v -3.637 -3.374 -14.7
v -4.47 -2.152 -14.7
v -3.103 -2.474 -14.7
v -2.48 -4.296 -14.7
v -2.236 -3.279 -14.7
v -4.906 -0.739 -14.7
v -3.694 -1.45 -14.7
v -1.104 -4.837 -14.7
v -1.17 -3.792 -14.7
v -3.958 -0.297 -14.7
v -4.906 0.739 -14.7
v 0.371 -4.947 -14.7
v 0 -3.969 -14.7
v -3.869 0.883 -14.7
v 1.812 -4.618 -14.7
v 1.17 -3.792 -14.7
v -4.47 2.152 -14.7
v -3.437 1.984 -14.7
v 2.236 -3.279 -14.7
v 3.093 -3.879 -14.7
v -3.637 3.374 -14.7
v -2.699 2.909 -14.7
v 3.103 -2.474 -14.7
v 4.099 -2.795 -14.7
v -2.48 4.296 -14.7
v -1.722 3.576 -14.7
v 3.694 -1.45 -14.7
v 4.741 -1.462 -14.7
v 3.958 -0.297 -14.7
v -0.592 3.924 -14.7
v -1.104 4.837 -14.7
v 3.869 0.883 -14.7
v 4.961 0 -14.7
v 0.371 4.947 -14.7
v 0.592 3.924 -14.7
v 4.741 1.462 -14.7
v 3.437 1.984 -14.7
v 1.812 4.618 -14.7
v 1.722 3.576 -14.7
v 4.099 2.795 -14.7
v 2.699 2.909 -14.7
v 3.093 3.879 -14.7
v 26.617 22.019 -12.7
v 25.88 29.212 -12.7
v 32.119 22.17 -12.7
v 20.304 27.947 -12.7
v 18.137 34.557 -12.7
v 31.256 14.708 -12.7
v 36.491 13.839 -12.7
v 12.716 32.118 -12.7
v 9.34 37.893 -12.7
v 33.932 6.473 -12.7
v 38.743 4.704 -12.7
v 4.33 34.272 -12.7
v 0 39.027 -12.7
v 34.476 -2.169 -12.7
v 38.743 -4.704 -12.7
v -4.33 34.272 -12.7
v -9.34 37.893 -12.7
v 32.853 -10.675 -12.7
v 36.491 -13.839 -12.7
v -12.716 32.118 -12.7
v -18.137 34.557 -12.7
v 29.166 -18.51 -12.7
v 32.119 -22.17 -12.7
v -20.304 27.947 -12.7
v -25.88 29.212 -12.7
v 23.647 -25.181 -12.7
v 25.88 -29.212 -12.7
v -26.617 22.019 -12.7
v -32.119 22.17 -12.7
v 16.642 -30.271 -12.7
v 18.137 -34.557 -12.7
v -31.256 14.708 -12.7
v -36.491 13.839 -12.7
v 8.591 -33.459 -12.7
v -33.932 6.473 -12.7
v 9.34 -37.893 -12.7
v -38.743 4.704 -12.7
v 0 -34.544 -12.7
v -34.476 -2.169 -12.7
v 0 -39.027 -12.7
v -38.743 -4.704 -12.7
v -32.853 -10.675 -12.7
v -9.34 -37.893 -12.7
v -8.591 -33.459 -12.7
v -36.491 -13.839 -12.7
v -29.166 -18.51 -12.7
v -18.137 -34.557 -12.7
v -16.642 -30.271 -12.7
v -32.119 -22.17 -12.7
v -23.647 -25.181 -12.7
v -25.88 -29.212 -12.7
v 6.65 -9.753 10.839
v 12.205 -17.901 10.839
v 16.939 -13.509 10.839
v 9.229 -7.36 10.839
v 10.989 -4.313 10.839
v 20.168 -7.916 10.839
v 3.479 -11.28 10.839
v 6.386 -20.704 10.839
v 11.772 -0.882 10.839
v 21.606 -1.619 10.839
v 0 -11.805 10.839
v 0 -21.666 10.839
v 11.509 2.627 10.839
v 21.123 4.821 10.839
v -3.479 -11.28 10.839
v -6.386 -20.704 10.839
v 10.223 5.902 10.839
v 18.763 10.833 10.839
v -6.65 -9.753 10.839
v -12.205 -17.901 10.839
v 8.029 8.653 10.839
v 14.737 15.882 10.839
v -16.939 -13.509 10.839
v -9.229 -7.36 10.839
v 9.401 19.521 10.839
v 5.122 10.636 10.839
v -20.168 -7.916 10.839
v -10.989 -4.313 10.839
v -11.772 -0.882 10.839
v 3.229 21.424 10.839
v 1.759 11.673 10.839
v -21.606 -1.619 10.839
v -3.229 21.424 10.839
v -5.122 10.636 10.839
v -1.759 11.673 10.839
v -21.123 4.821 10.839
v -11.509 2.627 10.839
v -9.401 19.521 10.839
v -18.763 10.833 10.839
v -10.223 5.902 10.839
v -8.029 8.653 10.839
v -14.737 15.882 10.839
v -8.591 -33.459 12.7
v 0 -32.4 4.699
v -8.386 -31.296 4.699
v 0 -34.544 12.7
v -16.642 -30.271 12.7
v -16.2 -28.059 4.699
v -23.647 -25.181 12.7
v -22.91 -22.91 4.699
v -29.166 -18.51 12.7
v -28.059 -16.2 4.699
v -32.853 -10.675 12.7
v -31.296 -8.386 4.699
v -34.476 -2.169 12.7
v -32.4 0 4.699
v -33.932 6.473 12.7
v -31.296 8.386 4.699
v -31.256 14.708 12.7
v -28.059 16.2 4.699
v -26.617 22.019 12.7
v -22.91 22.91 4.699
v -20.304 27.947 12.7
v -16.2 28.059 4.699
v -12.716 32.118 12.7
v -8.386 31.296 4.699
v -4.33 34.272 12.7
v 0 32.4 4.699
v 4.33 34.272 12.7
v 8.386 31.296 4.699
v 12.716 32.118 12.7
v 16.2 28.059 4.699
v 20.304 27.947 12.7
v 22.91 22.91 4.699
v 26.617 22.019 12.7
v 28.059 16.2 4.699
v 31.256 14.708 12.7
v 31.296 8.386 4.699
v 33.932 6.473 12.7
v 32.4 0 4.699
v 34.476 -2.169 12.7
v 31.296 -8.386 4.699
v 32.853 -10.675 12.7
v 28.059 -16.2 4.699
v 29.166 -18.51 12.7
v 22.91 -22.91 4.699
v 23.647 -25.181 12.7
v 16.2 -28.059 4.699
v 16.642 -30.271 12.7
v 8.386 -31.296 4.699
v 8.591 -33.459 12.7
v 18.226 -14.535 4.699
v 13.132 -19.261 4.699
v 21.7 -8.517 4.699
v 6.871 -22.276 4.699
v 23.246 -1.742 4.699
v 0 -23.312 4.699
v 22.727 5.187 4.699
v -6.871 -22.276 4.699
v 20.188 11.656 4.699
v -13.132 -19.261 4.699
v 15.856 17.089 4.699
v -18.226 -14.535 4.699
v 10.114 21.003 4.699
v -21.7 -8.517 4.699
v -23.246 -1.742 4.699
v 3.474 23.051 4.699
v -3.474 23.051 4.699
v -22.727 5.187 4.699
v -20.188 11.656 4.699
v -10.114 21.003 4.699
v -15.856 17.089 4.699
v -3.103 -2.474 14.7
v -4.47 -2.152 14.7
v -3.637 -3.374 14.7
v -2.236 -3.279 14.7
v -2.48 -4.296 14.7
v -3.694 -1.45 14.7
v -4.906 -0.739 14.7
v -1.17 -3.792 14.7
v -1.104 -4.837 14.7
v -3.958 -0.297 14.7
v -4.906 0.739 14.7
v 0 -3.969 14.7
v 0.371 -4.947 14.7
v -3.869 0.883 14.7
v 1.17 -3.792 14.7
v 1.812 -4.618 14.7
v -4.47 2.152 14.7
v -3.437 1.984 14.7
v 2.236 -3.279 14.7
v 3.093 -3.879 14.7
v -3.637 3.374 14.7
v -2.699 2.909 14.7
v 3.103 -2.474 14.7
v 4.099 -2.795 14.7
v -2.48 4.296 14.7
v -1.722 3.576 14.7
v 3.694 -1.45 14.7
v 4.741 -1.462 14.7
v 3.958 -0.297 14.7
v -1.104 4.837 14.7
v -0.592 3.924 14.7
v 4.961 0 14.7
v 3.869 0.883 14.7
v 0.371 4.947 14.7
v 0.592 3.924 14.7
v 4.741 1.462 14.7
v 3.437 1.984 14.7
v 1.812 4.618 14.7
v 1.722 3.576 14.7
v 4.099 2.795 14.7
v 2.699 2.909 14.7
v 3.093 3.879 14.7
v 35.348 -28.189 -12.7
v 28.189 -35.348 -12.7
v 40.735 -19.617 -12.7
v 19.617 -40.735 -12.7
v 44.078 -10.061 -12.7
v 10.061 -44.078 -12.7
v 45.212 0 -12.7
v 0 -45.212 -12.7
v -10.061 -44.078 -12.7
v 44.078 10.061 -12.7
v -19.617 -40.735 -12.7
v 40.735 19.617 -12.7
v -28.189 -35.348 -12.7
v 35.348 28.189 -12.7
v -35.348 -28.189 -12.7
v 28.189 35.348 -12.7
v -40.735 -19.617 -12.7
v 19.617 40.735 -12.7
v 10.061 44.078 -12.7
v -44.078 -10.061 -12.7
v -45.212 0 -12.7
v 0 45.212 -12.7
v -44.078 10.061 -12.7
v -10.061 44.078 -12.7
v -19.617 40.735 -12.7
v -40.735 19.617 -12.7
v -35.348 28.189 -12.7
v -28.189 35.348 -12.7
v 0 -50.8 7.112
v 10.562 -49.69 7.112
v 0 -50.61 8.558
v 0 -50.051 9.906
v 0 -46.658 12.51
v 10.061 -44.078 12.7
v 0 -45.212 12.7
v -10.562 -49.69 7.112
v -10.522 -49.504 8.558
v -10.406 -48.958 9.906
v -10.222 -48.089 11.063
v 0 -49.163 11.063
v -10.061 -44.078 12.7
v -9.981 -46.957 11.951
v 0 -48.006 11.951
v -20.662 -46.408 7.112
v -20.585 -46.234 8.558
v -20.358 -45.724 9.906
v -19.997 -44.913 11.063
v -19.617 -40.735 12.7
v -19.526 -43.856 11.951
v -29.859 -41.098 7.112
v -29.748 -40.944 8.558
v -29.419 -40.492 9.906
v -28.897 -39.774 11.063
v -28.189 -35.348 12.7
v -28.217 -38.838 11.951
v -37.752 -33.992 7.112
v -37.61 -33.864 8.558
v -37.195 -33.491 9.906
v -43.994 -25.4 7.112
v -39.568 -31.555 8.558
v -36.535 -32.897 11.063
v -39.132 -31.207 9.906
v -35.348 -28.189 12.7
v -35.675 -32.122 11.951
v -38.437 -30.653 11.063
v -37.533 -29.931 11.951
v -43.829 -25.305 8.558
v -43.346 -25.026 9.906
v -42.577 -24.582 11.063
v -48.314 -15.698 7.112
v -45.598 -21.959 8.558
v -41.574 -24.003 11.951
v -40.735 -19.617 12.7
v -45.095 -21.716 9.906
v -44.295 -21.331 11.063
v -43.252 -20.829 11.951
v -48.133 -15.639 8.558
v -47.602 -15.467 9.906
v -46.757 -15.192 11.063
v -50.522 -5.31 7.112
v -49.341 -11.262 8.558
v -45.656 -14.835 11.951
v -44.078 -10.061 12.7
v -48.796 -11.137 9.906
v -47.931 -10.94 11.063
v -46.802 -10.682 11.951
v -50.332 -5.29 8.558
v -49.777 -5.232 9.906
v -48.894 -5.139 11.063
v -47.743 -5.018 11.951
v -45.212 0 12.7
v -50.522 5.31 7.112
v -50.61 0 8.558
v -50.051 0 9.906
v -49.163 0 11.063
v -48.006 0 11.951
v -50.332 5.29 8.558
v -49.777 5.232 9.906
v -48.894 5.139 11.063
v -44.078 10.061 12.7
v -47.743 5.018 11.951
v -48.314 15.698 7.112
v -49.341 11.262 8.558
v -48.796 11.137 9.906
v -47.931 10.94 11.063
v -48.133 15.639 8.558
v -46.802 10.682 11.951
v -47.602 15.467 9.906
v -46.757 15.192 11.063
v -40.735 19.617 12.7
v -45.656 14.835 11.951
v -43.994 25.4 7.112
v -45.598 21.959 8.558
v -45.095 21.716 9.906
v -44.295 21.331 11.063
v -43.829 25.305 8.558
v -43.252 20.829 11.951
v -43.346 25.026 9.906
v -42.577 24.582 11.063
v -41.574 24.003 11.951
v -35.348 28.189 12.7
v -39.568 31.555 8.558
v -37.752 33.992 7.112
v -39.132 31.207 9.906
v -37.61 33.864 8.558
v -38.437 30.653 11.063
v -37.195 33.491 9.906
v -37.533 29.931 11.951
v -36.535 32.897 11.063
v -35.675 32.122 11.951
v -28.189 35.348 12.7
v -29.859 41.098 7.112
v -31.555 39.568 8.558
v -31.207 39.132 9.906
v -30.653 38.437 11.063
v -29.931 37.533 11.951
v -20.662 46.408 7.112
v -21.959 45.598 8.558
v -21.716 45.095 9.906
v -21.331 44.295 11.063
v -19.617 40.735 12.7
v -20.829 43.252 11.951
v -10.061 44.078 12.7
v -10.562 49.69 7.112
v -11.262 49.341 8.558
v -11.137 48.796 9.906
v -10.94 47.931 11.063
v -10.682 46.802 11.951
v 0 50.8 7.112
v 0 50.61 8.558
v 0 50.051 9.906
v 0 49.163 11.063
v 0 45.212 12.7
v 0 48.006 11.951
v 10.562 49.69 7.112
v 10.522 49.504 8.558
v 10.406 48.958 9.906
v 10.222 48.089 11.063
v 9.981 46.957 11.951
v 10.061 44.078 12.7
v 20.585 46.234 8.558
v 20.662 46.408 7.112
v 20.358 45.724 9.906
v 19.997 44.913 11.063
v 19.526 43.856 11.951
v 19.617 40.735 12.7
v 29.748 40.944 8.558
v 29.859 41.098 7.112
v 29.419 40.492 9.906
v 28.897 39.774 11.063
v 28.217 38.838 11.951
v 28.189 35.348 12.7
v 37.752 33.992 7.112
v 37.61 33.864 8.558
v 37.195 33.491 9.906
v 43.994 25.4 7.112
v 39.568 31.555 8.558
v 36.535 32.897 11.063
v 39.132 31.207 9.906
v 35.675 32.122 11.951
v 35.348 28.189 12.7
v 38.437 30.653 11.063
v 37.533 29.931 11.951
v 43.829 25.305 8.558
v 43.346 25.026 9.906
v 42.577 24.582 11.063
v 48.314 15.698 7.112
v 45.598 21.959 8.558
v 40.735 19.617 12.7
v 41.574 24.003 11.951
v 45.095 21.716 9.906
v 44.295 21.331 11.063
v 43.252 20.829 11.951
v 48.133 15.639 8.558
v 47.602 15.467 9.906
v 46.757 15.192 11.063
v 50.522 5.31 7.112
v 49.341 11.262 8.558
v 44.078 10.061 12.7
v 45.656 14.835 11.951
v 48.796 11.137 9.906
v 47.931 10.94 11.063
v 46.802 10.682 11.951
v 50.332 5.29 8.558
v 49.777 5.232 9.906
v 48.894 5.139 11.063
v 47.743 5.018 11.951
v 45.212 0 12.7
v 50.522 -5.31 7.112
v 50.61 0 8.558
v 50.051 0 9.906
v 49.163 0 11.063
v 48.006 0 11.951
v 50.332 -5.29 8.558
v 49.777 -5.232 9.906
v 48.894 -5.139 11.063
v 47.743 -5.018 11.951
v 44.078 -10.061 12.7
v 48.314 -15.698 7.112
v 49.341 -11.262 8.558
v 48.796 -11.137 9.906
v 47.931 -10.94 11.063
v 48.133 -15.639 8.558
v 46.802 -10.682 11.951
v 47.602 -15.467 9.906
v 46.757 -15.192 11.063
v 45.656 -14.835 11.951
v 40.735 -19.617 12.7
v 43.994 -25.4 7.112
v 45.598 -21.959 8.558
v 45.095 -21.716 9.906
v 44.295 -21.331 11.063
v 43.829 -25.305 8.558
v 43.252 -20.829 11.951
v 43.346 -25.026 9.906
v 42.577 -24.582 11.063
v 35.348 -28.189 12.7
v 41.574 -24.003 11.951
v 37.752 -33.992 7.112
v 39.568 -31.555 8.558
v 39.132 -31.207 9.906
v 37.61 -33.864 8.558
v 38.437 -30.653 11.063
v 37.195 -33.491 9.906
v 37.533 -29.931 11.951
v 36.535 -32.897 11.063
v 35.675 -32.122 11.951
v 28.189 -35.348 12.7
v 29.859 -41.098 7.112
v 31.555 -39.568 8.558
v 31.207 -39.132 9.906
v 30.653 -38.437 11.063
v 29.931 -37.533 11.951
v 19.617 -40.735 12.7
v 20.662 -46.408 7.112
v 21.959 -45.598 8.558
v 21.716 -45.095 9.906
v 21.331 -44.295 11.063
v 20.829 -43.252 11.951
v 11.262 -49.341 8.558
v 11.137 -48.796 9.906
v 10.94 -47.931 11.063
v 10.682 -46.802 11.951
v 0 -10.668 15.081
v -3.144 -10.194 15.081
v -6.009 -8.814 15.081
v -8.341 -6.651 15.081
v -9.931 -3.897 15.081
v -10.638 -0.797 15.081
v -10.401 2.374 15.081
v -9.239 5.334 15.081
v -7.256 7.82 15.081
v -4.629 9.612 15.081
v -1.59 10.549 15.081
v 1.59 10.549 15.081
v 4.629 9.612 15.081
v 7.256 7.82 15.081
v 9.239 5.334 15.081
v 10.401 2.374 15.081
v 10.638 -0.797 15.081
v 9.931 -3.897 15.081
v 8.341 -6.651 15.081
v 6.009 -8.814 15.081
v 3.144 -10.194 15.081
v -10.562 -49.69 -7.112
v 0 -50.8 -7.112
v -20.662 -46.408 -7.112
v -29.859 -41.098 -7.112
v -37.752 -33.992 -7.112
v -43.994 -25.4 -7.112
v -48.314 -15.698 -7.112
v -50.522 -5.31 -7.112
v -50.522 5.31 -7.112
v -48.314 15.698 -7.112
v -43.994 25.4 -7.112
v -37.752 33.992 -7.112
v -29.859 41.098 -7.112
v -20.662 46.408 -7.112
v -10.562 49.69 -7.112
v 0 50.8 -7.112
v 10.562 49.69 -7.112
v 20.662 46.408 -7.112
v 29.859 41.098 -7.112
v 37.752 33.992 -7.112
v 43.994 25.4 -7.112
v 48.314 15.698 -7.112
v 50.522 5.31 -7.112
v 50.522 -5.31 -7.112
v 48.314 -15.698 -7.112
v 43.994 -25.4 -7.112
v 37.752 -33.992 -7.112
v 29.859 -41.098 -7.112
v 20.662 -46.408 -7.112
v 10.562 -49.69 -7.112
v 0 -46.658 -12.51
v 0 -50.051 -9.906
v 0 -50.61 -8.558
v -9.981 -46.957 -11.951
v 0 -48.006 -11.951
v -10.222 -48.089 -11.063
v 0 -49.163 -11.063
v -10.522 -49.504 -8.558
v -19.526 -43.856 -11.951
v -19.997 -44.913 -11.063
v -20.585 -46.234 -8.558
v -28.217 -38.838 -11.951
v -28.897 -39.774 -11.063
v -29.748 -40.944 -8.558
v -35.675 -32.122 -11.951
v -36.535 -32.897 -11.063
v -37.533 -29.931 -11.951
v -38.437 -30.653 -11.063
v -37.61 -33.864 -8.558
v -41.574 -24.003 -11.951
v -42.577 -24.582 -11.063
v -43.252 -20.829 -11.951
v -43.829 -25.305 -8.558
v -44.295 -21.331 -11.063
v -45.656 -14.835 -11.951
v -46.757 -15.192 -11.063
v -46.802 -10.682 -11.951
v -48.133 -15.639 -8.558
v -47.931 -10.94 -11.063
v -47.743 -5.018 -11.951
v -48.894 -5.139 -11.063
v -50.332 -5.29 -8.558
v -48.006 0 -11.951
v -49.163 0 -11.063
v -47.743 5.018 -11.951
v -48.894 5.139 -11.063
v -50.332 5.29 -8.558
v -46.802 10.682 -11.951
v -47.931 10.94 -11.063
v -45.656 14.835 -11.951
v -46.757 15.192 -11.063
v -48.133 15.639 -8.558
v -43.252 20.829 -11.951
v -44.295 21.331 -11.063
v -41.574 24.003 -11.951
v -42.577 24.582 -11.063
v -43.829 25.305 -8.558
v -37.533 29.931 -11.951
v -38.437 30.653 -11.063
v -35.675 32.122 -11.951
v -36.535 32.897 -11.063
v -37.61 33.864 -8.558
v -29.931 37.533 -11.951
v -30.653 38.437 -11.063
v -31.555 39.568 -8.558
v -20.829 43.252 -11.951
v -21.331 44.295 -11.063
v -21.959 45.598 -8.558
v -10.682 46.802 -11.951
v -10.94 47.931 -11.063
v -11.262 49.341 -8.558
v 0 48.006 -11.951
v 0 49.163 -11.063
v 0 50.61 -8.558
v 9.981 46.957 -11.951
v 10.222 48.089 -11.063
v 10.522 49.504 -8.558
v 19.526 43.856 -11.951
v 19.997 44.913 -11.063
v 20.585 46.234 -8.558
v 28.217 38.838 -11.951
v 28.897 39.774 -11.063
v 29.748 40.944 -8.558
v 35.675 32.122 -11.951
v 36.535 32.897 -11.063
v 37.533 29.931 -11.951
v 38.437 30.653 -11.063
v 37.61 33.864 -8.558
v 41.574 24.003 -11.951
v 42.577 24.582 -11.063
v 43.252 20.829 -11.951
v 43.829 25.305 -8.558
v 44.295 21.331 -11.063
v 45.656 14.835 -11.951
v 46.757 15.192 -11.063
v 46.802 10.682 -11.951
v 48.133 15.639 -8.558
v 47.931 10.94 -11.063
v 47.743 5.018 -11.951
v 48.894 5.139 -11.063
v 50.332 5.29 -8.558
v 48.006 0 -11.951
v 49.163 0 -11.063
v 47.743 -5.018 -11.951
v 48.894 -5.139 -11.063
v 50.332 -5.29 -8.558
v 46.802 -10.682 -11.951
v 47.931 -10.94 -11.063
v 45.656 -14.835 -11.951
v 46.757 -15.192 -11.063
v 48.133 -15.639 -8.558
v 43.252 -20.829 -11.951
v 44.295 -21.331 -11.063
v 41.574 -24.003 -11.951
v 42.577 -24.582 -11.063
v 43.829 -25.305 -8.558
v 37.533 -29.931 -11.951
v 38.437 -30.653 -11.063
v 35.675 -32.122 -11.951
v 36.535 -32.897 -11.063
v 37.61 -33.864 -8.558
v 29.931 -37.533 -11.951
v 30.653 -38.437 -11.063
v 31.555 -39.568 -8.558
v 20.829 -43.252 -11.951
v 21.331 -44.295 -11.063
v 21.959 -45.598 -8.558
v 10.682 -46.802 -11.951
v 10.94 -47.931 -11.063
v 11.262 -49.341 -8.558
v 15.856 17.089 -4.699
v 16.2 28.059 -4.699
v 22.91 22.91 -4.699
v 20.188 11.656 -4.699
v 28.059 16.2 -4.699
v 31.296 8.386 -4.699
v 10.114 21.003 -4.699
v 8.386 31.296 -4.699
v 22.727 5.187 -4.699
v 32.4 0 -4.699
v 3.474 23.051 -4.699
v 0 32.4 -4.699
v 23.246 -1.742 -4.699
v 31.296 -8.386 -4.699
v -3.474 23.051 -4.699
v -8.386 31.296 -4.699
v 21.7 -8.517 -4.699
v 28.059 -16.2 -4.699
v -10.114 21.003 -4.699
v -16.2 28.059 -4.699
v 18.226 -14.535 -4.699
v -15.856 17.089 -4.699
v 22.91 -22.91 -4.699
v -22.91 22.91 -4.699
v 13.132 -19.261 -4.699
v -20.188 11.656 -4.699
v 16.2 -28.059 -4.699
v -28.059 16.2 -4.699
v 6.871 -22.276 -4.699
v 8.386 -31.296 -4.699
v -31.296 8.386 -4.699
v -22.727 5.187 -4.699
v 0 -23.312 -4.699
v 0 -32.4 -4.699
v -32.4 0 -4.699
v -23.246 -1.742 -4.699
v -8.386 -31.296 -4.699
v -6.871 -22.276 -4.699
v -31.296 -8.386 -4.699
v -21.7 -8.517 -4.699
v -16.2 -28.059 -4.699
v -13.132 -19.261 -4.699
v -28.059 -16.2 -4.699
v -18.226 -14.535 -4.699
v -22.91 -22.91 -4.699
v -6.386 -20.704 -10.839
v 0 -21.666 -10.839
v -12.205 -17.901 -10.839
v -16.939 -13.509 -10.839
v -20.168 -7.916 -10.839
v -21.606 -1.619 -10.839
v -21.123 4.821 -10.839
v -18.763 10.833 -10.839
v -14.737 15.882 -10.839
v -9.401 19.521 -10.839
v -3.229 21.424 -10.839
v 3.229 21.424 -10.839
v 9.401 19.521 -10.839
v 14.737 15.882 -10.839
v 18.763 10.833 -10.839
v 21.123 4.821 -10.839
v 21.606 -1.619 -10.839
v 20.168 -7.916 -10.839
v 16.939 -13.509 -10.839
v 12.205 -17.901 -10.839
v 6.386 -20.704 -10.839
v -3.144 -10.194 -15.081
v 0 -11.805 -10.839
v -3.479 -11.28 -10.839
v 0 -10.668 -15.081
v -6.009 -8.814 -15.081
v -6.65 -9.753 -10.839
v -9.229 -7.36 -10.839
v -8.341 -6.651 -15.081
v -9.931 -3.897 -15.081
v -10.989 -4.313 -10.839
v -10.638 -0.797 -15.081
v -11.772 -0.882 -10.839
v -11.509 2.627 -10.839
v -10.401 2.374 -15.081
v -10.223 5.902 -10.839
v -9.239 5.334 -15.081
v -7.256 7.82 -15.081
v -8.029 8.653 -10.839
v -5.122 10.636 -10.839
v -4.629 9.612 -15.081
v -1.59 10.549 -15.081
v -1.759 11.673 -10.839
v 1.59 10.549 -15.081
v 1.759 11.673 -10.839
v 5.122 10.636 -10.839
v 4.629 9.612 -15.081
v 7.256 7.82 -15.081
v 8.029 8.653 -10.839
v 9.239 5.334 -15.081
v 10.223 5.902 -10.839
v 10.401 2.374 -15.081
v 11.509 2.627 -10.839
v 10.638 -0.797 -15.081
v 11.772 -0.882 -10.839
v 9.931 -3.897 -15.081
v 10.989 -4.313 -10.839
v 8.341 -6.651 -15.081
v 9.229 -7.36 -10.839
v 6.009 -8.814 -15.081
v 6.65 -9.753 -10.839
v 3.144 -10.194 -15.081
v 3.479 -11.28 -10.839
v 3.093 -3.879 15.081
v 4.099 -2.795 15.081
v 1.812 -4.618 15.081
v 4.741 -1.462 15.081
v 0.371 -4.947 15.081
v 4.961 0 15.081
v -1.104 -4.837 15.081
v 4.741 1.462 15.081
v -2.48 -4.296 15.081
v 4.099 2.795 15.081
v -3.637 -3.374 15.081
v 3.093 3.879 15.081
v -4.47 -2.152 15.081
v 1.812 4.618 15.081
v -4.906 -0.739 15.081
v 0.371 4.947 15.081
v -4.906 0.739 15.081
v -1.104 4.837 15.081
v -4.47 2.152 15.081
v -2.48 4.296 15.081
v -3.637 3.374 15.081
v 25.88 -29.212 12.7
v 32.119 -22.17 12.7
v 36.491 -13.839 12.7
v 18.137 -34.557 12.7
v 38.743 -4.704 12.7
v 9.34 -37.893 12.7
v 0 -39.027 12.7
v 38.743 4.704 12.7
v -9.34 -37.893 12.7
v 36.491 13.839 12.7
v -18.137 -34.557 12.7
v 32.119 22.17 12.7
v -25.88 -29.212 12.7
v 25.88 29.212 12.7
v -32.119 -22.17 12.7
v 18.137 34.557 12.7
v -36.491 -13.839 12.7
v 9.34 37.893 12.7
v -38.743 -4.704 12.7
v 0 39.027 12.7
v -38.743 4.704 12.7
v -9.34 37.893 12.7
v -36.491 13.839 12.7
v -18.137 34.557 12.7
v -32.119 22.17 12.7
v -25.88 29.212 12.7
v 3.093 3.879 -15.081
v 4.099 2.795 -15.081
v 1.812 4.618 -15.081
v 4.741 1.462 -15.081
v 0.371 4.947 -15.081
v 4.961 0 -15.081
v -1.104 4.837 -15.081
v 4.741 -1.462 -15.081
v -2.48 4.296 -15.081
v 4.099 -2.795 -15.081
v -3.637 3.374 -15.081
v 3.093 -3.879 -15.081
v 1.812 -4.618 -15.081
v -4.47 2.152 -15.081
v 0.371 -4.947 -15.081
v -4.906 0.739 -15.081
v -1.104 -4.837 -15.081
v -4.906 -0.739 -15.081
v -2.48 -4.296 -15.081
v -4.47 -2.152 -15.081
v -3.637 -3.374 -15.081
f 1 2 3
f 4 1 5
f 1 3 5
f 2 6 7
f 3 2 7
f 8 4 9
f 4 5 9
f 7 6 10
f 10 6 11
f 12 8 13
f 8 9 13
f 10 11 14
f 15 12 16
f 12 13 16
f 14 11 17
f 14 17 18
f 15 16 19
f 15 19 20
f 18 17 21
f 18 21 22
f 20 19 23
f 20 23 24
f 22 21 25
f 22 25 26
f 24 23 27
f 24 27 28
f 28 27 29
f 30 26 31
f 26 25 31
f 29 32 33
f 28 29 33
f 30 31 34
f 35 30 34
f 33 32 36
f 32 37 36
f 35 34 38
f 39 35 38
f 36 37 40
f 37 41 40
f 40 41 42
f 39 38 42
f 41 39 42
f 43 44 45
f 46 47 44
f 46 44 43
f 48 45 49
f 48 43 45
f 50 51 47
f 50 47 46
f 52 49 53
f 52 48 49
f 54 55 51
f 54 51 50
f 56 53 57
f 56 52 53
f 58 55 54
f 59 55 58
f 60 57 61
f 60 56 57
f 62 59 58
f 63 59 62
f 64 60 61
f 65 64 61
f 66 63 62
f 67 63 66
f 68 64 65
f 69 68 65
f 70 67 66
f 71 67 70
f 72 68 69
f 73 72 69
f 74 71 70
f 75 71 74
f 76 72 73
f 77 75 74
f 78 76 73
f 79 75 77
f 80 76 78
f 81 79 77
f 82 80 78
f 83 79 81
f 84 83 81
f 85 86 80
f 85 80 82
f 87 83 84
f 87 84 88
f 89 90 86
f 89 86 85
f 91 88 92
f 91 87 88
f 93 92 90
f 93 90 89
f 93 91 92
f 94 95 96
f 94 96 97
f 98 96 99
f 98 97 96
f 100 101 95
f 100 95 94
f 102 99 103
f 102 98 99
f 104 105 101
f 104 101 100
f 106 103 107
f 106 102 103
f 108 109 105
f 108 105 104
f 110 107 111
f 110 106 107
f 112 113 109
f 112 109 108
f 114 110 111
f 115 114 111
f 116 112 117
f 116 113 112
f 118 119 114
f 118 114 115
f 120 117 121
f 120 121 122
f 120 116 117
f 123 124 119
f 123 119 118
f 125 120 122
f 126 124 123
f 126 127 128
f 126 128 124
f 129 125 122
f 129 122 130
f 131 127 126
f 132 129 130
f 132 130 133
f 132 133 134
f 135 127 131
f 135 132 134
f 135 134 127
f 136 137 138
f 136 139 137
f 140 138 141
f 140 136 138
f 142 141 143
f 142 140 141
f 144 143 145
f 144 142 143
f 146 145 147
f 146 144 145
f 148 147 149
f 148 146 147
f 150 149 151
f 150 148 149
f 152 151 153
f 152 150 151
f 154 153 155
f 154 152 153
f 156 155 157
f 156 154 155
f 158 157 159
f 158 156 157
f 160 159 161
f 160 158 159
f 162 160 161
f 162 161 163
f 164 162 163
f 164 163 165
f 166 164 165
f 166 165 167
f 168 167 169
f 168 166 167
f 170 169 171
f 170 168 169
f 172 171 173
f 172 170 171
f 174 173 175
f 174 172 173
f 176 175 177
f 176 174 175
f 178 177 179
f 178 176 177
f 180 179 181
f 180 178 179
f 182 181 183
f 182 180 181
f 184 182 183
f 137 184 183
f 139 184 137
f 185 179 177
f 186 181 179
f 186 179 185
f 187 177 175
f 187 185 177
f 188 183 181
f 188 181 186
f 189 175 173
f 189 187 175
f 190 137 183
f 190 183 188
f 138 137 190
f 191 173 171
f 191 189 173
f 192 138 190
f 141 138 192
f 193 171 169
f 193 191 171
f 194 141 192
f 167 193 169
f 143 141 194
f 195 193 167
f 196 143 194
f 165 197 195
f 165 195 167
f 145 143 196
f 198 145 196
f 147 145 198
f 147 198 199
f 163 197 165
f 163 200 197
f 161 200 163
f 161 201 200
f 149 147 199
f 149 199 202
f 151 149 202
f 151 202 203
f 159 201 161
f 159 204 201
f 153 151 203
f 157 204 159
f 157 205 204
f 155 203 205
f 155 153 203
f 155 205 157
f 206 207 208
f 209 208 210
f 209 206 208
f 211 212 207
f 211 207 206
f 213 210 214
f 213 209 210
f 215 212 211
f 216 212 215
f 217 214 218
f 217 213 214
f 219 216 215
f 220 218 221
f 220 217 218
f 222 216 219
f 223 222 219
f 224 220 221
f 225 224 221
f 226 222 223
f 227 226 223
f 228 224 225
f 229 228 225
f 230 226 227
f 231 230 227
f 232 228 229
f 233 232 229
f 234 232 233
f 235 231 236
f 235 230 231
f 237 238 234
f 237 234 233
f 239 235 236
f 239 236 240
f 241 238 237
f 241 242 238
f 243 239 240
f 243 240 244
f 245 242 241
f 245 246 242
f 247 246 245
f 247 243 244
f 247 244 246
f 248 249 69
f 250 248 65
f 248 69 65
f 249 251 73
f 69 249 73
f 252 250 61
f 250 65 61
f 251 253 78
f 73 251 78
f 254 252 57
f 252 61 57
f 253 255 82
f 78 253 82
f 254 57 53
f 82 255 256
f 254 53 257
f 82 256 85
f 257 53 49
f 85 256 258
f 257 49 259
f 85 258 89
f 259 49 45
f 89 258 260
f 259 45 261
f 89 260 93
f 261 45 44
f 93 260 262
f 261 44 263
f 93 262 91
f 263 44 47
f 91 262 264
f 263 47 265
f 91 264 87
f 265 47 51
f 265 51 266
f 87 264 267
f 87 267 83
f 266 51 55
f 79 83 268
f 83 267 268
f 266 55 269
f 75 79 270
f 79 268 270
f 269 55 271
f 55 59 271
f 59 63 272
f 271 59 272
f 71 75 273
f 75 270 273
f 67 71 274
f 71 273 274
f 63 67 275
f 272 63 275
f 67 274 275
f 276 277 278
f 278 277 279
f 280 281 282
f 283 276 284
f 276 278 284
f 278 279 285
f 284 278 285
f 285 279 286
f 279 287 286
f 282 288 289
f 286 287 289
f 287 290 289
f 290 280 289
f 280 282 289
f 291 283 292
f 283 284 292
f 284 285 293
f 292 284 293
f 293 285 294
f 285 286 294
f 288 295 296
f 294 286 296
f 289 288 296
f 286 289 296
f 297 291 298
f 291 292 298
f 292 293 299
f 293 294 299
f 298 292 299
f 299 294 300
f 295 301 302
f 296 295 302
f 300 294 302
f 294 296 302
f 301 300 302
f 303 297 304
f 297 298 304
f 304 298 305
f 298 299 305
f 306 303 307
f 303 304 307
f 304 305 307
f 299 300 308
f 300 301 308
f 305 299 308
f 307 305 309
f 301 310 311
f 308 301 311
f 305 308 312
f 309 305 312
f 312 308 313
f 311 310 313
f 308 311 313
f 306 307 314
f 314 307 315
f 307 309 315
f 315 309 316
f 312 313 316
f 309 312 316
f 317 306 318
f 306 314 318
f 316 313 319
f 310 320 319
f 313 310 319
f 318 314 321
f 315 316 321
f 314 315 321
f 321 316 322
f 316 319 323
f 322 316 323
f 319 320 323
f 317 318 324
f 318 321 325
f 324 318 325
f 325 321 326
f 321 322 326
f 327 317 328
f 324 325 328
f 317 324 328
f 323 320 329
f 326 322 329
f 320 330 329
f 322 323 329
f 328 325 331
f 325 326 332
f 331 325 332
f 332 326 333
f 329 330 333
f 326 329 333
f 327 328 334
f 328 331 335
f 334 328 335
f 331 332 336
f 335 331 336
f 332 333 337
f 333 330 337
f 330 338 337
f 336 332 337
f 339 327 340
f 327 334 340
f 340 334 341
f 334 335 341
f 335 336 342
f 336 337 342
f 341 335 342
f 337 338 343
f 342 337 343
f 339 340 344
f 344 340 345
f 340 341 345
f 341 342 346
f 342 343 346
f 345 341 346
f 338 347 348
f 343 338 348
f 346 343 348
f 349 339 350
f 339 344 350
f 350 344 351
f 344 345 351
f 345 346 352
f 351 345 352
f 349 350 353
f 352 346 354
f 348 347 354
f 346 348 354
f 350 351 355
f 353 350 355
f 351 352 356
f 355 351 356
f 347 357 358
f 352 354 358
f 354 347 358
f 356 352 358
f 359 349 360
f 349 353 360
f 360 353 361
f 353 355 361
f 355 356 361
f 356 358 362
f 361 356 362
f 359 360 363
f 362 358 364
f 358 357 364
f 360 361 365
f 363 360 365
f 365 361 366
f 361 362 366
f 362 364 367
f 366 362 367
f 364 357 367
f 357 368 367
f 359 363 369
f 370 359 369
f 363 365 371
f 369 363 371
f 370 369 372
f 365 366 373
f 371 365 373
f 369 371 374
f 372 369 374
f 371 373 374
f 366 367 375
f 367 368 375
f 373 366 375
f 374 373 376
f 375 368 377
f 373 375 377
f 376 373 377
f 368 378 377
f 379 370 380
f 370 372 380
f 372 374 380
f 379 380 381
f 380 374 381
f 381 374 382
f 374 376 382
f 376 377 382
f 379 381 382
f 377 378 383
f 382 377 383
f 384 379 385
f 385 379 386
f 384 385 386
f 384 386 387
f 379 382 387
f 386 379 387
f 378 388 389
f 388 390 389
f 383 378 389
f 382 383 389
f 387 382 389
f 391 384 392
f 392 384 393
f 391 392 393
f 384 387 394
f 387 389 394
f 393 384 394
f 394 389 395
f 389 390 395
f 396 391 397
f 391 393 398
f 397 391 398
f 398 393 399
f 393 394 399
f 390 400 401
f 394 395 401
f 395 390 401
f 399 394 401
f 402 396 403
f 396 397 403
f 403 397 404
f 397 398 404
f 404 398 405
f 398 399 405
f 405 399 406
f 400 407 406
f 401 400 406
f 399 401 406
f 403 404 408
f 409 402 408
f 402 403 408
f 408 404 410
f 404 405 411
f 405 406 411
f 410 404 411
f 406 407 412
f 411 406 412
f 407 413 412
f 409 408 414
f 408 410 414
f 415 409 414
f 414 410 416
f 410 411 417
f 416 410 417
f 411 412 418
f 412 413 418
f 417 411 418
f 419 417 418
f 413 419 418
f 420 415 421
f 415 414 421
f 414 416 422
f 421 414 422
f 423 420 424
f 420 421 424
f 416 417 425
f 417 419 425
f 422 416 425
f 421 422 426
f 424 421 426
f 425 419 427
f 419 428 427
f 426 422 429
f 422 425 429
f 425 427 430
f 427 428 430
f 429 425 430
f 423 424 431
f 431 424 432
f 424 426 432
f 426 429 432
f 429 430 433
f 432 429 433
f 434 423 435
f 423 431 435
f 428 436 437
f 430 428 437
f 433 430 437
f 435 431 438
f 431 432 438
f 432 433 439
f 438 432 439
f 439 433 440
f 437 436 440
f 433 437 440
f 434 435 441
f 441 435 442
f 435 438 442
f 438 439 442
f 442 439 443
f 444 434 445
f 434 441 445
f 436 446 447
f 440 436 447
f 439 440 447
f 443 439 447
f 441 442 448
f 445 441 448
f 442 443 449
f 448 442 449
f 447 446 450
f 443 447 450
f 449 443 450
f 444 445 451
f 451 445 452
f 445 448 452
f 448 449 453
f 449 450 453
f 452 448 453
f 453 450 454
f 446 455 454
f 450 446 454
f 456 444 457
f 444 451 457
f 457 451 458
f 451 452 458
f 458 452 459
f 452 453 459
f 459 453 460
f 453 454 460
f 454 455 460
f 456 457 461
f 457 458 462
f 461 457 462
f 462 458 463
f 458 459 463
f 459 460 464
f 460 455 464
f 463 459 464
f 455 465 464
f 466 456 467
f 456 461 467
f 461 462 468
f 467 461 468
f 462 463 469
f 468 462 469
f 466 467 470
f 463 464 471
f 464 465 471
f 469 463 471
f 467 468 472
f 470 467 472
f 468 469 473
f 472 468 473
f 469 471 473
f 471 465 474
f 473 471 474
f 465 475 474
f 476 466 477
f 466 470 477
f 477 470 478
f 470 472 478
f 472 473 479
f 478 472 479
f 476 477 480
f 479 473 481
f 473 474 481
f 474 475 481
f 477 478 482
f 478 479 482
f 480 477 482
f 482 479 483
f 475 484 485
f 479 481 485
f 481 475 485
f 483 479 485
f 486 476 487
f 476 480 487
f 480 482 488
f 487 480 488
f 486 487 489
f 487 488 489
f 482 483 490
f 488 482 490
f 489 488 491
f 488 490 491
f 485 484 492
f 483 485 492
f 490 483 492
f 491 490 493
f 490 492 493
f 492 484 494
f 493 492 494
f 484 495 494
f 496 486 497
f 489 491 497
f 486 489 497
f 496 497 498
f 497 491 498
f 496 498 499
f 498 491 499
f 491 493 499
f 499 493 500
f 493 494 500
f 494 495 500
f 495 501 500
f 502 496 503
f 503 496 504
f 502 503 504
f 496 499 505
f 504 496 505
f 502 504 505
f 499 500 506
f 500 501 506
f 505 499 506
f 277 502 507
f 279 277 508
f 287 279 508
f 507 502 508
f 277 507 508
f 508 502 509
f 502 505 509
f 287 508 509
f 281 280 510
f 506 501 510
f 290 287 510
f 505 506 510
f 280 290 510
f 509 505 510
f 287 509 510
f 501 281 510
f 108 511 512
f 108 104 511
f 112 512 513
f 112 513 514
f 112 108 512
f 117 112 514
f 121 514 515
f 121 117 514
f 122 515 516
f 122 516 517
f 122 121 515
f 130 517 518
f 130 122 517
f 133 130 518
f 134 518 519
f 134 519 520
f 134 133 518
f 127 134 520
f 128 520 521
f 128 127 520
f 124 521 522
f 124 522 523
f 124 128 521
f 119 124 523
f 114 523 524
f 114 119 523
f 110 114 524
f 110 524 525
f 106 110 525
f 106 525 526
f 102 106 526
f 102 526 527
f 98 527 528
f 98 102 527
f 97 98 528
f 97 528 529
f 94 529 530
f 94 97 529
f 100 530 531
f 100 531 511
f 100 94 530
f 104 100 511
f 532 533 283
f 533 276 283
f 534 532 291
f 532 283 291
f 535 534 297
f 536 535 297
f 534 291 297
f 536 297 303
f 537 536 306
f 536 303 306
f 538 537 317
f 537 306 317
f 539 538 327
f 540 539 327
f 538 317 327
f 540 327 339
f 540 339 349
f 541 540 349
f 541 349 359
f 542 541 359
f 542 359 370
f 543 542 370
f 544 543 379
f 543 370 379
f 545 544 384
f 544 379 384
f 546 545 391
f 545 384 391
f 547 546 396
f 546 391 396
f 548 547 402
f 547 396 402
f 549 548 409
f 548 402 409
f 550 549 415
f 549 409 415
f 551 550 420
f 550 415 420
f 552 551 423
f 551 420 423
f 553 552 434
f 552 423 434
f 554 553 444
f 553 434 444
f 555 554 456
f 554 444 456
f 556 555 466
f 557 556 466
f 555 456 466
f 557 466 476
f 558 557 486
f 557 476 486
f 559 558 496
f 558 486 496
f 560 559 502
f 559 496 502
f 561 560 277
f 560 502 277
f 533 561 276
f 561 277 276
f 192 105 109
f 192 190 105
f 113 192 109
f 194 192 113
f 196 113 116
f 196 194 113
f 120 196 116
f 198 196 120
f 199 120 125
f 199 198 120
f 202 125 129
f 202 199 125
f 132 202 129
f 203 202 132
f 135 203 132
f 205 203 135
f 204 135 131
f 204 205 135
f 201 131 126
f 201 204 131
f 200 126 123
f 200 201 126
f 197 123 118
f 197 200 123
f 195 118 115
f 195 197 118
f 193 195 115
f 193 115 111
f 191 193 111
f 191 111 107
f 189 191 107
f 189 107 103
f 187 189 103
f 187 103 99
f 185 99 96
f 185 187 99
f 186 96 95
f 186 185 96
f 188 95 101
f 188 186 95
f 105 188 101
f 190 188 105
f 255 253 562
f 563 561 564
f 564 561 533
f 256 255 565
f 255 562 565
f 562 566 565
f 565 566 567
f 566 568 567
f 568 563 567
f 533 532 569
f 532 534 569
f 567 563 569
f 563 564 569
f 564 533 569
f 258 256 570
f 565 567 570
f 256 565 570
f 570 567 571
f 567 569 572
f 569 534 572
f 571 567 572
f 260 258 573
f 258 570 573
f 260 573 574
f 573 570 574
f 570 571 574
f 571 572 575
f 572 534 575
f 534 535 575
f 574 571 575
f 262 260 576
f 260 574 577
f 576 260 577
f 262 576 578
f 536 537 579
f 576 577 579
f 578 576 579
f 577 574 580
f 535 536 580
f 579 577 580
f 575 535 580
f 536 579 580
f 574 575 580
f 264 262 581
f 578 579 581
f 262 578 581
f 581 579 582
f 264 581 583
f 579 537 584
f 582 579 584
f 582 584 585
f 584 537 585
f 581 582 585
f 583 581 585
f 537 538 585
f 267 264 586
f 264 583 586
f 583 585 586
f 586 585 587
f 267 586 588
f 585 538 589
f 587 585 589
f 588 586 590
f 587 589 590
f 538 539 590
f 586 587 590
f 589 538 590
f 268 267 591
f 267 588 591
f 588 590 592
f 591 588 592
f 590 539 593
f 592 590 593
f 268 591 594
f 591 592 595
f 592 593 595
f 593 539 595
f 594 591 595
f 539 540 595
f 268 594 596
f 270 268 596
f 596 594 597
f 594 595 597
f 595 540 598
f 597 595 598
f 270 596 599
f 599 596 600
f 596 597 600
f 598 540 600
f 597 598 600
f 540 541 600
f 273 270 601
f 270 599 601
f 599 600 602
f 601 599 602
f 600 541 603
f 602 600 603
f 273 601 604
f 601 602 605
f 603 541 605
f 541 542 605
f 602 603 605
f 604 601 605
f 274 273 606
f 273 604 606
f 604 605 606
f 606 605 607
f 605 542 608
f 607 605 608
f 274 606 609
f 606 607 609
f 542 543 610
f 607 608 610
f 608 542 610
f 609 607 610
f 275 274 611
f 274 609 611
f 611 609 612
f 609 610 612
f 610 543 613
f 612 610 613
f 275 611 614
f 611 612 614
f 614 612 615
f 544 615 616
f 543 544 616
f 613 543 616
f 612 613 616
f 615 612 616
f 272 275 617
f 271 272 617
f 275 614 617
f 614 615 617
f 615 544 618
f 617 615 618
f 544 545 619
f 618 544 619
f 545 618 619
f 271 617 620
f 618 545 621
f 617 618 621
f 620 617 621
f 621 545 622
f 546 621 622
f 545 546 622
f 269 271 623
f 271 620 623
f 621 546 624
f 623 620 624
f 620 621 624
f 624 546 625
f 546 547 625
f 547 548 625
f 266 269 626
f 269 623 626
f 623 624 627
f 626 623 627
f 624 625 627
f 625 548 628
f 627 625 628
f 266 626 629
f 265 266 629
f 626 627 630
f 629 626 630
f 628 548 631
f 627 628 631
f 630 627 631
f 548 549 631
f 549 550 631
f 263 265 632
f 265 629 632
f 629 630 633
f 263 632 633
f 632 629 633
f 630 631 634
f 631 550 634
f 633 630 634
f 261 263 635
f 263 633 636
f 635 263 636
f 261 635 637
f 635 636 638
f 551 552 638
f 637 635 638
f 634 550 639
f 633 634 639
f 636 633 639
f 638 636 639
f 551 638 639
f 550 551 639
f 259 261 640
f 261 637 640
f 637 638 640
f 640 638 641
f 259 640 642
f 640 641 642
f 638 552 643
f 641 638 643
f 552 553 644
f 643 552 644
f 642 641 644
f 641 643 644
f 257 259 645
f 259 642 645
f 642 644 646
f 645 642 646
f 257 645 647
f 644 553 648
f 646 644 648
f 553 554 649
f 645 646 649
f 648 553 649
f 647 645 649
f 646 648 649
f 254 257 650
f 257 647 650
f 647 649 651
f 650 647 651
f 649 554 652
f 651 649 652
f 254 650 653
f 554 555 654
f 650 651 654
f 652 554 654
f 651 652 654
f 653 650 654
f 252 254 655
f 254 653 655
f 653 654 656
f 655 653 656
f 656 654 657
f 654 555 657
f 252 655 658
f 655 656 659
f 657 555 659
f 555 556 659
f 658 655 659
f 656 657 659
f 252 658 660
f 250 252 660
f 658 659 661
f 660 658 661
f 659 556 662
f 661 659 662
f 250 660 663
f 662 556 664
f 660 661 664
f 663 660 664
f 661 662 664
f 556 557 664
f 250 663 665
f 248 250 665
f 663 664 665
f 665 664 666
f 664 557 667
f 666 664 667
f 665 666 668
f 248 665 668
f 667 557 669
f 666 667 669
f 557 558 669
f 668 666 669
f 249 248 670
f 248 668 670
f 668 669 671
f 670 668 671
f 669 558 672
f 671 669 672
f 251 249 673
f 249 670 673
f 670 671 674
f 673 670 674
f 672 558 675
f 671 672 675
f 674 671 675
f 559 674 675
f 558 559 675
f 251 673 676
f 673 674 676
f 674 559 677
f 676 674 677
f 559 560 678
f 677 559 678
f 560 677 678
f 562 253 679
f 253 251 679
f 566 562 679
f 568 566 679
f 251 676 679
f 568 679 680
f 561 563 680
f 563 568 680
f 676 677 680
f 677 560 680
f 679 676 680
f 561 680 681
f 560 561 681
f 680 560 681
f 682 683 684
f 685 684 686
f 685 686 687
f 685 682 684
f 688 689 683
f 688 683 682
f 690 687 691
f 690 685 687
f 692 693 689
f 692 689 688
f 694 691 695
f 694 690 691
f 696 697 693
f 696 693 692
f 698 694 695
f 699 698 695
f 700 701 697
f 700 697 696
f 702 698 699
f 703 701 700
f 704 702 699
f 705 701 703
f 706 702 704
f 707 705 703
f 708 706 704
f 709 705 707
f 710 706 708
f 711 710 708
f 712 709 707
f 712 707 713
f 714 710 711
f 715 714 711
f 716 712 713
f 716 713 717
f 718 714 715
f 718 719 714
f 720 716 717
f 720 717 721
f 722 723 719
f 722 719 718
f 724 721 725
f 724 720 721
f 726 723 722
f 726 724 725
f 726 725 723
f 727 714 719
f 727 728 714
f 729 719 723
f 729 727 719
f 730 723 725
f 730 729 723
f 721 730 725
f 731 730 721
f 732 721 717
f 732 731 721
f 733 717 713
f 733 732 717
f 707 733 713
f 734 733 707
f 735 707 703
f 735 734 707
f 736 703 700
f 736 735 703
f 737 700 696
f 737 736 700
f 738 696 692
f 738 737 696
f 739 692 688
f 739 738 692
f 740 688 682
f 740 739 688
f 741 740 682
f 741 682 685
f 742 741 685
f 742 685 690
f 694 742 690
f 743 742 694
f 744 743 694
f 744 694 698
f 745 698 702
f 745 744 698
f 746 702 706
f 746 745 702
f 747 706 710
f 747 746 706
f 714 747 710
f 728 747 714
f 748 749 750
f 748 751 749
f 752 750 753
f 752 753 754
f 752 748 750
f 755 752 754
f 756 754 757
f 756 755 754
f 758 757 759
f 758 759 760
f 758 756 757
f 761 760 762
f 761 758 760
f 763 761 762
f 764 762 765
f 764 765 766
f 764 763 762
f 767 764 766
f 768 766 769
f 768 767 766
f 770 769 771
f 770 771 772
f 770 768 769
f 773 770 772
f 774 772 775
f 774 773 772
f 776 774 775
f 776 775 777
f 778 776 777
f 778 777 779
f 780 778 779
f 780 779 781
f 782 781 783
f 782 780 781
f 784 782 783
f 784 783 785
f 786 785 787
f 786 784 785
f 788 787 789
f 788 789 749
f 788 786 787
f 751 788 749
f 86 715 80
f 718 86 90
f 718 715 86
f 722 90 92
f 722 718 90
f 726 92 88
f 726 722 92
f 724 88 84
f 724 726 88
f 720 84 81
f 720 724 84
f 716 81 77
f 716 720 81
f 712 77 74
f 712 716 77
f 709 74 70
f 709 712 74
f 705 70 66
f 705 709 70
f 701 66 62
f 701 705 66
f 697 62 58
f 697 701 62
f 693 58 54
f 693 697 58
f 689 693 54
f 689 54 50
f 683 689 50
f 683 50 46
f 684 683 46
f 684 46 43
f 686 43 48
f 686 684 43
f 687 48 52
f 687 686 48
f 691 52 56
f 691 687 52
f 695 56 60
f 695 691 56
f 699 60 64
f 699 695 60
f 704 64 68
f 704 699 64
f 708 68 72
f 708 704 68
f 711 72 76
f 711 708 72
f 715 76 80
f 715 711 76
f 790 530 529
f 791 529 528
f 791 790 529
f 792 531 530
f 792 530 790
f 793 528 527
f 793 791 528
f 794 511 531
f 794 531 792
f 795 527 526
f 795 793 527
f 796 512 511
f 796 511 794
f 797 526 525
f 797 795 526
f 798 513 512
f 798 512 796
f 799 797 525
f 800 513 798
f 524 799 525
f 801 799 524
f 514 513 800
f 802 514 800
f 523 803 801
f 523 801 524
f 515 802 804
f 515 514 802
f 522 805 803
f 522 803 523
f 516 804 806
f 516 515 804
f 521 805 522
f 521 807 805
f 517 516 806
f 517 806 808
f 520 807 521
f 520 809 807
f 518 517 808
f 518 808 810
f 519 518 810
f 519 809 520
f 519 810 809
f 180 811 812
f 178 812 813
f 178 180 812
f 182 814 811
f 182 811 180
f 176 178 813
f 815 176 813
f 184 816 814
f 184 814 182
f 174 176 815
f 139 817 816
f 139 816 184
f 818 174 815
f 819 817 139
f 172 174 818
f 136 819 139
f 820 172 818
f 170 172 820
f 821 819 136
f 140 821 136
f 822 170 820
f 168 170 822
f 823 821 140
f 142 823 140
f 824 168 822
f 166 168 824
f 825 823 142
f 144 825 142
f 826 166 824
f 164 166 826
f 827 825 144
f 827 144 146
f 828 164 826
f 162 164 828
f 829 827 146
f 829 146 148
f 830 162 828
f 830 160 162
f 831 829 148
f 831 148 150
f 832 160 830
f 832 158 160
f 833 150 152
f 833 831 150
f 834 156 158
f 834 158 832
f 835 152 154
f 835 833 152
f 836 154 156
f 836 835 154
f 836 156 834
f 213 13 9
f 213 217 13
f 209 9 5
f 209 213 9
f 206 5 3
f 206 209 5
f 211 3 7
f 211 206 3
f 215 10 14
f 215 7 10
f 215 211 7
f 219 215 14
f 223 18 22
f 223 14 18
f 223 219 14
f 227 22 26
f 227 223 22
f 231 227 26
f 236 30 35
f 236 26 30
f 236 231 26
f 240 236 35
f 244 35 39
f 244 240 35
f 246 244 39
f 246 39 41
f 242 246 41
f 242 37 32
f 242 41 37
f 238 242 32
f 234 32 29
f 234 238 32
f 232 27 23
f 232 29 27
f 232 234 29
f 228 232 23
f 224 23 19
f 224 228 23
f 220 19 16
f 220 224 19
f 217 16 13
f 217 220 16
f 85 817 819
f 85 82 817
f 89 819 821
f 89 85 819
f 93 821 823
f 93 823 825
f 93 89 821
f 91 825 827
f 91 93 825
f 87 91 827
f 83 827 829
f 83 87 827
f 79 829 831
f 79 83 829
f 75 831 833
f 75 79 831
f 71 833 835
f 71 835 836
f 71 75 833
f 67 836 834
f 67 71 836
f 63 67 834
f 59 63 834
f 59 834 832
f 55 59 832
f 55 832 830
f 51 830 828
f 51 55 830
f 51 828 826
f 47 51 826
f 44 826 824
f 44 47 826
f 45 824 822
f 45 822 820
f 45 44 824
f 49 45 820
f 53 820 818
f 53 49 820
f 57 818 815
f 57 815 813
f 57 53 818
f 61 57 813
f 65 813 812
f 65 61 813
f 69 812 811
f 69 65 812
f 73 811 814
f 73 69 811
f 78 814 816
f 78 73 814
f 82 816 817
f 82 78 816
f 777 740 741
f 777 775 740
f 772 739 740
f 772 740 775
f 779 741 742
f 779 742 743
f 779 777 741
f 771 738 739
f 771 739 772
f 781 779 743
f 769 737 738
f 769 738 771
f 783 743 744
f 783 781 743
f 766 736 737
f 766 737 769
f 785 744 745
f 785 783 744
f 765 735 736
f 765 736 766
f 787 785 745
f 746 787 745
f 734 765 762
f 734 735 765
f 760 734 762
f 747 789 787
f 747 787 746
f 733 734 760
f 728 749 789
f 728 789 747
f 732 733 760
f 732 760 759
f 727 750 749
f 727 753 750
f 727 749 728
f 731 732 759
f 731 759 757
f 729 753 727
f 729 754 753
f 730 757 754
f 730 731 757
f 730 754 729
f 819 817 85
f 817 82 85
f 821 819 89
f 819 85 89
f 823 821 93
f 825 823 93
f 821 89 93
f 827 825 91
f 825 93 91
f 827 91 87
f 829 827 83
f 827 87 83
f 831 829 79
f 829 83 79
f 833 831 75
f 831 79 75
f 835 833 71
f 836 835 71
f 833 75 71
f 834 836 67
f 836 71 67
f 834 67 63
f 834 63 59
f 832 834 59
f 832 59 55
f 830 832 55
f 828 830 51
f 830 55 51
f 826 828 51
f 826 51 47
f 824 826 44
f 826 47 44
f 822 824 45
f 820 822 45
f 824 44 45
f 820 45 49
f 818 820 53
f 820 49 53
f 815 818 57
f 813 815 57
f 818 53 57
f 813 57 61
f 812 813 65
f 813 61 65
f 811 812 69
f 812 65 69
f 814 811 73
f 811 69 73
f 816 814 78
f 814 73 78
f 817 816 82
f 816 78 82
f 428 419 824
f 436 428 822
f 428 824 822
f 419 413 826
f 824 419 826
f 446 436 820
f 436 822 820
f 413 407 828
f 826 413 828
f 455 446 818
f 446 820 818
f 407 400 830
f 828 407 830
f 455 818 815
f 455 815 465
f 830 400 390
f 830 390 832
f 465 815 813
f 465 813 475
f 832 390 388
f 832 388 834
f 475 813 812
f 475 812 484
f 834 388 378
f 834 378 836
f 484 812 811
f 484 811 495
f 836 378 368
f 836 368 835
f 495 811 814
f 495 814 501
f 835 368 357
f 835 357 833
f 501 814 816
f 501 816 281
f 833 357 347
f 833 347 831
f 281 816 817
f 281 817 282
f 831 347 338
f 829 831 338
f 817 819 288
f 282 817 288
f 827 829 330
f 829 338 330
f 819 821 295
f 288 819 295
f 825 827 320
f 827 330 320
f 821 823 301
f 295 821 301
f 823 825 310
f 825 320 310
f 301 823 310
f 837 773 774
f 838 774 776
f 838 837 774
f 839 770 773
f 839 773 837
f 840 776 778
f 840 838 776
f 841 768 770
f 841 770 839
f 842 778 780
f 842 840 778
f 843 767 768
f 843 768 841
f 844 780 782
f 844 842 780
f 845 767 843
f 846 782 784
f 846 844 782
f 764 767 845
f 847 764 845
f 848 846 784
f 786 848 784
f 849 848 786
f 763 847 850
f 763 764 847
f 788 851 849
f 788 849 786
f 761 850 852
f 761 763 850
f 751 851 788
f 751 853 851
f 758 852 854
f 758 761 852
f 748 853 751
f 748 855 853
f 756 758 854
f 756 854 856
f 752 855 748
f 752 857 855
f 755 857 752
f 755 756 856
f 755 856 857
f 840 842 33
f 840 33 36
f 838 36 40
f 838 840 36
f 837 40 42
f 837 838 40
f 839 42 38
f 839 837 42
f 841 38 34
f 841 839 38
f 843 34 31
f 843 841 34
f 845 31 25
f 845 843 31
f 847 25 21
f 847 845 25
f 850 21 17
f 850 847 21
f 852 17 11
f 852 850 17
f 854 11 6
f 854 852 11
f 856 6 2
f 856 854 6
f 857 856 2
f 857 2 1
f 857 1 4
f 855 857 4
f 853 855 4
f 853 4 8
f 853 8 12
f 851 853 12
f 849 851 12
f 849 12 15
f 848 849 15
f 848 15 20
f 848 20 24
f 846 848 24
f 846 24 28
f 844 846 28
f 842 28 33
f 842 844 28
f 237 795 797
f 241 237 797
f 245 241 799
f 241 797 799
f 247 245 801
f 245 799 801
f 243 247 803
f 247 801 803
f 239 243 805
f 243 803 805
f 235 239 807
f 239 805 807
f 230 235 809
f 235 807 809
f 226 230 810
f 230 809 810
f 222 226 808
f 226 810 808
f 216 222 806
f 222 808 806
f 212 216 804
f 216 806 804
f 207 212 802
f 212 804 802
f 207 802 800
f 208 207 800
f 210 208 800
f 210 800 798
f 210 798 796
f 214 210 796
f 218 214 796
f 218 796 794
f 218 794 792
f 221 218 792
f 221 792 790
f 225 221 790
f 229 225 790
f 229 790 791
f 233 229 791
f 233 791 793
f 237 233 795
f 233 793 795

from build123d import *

# Parameters (mm, degrees)
SKETCH6_R          = 4.9609375
CUT_EXTRUDE1_DEPTH = 0.381


with BuildPart() as part:
    # Sketch3 → Revolve1 (revolve)
    with BuildSketch(Plane(origin=(0, 0, 0), x_dir=(0, 0, -1), z_dir=(1, 0, 0)), mode=Mode.PRIVATE) as revolve1_sk:
        with BuildLine():
            Line((7.112, 50.8), (-7.112, 50.8))
            ThreePointArc((-7.112, 50.8), (-11.063312693, 49.163312693), (-12.7, 45.212))
            Line((-12.7, 45.212), (-12.7, 39.0271))
            Line((-12.7, 39.0271), (0, 39.0271))
            Line((0, 39.0271), (12.7, 39.0271))
            Line((12.7, 39.0271), (12.7, 45.212))
            ThreePointArc((12.7, 45.212), (11.063312693, 49.163312693), (7.112, 50.8))
        make_face()
    revolve(revolve1_sk.sketch.rotate(Axis((0, 0, 15.08125), (0, 0, -1)), 180), axis=Axis((0, 0, 15.08125), (0, 0, -1)))


with BuildPart() as body_2:
    # Sketch4 → Revolve2 (revolve)
    with BuildSketch(Plane(origin=(0, 0, 0), x_dir=(0, 0, -1), z_dir=(1, 0, 0)), mode=Mode.PRIVATE) as revolve2_sk:
        Polygon((-12.7, 39.0271), (12.7, 39.0271), (12.7, 34.544), (4.699, 32.400138511), (4.699, 23.311528619), (10.83945, 21.6662), (10.83945, 11.804586884), (15.08125, 10.668), (15.08125, 3.96875), (-15.08125, 3.96875), (-15.08125, 10.668), (-10.83945, 11.804586884), (-10.83945, 21.6662), (-4.699, 23.311528619), (-4.699, 32.400138511), (-12.7, 34.544), align=None)
    revolve(revolve2_sk.sketch.rotate(Axis((0, 0, 15.08125), (0, 0, -1)), 180), axis=Axis((0, 0, 15.08125), (0, 0, -1)))

    # Sketch6 → Cut-Extrude1 (cut)
    with BuildSketch(Plane.XY.offset(15.08125)):
        Circle(SKETCH6_R)
    cut_extrude1 = extrude(amount=-CUT_EXTRUDE1_DEPTH, mode=Mode.SUBTRACT)

    # Mirror1: Cut-Extrude1 across plane
    add(cut_extrude1.mirror(Plane.XY), mode=Mode.SUBTRACT)


solid = Compound([part.part, body_2.part])
